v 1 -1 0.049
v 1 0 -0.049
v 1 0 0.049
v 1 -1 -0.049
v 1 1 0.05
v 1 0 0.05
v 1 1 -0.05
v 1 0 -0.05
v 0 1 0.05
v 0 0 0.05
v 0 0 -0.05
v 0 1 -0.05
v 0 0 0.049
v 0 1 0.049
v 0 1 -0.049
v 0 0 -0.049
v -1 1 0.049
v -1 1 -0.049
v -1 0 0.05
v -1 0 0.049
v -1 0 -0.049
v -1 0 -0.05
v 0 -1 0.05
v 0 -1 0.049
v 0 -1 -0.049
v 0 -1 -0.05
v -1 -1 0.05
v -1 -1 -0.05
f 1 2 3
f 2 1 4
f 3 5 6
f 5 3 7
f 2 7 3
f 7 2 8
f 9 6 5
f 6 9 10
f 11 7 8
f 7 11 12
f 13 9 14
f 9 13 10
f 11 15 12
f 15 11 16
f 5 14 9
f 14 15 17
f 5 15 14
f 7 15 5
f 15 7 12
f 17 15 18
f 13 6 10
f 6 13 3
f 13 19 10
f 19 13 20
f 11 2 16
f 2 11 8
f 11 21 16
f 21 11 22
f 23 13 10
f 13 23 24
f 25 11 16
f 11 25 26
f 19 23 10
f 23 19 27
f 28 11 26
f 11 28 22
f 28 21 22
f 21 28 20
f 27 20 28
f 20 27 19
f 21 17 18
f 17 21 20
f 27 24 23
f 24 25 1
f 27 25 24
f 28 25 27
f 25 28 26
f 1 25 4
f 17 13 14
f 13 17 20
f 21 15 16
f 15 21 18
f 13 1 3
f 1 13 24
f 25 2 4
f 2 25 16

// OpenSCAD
module Floor_01(Mat=0){
    Mat_0 = ["#748481","#c6d4cf"];
    Mat_1 = ["#f2eacf","#baab87"];
    Mat_2 = ["#83a492","#427c9d"];
    
    Material = [Mat_0,Mat_1,Mat_2];
    color(Material[Mat][0])
    translate([0.5,0.5,0])
    cube([1,1,0.1], center = true);


    color(Material[Mat][0])
    translate([-0.5,-0.5,0])
    cube([1,1,0.1], center = true);

               
    color(Material[Mat][1])
    translate([-0.5,0.5,0])
    cube([1,1,0.098], center = true);

    color(Material[Mat][1])
    translate([0.5,-0.5,0])
    cube([1,1,0.098], center = true);
}

Floor_01(Mat = 1);

// Written by Nicolì Angelo (Gengio) 2024: 
// MIT License

//Permission is hereby granted, free of charge, to any person obtaining a copy of this software and associated documentation files (the "Software"), to deal in the Software without restriction, including without limitation the rights to use, copy, modify, merge, publish, distribute, sublicense, and/or sell copies of the Software, and to permit persons to whom the Software is furnished to do so, subject to the following conditions:

//The above copyright notice and this permission notice shall be included in all copies or substantial portions of the Software.

//THE SOFTWARE IS PROVIDED "AS IS", WITHOUT WARRANTY OF ANY KIND, EXPRESS OR IMPLIED, INCLUDING BUT NOT LIMITED TO THE WARRANTIES OF MERCHANTABILITY, FITNESS FOR A PARTICULAR PURPOSE AND NONINFRINGEMENT. IN NO EVENT SHALL THE AUTHORS OR COPYRIGHT HOLDERS BE LIABLE FOR ANY CLAIM, DAMAGES OR OTHER LIABILITY, WHETHER IN AN ACTION OF CONTRACT, TORT OR OTHERWISE, ARISING FROM, OUT OF OR IN CONNECTION WITH THE SOFTWARE OR THE USE OR OTHER DEALINGS IN THE SOFTWARE.
